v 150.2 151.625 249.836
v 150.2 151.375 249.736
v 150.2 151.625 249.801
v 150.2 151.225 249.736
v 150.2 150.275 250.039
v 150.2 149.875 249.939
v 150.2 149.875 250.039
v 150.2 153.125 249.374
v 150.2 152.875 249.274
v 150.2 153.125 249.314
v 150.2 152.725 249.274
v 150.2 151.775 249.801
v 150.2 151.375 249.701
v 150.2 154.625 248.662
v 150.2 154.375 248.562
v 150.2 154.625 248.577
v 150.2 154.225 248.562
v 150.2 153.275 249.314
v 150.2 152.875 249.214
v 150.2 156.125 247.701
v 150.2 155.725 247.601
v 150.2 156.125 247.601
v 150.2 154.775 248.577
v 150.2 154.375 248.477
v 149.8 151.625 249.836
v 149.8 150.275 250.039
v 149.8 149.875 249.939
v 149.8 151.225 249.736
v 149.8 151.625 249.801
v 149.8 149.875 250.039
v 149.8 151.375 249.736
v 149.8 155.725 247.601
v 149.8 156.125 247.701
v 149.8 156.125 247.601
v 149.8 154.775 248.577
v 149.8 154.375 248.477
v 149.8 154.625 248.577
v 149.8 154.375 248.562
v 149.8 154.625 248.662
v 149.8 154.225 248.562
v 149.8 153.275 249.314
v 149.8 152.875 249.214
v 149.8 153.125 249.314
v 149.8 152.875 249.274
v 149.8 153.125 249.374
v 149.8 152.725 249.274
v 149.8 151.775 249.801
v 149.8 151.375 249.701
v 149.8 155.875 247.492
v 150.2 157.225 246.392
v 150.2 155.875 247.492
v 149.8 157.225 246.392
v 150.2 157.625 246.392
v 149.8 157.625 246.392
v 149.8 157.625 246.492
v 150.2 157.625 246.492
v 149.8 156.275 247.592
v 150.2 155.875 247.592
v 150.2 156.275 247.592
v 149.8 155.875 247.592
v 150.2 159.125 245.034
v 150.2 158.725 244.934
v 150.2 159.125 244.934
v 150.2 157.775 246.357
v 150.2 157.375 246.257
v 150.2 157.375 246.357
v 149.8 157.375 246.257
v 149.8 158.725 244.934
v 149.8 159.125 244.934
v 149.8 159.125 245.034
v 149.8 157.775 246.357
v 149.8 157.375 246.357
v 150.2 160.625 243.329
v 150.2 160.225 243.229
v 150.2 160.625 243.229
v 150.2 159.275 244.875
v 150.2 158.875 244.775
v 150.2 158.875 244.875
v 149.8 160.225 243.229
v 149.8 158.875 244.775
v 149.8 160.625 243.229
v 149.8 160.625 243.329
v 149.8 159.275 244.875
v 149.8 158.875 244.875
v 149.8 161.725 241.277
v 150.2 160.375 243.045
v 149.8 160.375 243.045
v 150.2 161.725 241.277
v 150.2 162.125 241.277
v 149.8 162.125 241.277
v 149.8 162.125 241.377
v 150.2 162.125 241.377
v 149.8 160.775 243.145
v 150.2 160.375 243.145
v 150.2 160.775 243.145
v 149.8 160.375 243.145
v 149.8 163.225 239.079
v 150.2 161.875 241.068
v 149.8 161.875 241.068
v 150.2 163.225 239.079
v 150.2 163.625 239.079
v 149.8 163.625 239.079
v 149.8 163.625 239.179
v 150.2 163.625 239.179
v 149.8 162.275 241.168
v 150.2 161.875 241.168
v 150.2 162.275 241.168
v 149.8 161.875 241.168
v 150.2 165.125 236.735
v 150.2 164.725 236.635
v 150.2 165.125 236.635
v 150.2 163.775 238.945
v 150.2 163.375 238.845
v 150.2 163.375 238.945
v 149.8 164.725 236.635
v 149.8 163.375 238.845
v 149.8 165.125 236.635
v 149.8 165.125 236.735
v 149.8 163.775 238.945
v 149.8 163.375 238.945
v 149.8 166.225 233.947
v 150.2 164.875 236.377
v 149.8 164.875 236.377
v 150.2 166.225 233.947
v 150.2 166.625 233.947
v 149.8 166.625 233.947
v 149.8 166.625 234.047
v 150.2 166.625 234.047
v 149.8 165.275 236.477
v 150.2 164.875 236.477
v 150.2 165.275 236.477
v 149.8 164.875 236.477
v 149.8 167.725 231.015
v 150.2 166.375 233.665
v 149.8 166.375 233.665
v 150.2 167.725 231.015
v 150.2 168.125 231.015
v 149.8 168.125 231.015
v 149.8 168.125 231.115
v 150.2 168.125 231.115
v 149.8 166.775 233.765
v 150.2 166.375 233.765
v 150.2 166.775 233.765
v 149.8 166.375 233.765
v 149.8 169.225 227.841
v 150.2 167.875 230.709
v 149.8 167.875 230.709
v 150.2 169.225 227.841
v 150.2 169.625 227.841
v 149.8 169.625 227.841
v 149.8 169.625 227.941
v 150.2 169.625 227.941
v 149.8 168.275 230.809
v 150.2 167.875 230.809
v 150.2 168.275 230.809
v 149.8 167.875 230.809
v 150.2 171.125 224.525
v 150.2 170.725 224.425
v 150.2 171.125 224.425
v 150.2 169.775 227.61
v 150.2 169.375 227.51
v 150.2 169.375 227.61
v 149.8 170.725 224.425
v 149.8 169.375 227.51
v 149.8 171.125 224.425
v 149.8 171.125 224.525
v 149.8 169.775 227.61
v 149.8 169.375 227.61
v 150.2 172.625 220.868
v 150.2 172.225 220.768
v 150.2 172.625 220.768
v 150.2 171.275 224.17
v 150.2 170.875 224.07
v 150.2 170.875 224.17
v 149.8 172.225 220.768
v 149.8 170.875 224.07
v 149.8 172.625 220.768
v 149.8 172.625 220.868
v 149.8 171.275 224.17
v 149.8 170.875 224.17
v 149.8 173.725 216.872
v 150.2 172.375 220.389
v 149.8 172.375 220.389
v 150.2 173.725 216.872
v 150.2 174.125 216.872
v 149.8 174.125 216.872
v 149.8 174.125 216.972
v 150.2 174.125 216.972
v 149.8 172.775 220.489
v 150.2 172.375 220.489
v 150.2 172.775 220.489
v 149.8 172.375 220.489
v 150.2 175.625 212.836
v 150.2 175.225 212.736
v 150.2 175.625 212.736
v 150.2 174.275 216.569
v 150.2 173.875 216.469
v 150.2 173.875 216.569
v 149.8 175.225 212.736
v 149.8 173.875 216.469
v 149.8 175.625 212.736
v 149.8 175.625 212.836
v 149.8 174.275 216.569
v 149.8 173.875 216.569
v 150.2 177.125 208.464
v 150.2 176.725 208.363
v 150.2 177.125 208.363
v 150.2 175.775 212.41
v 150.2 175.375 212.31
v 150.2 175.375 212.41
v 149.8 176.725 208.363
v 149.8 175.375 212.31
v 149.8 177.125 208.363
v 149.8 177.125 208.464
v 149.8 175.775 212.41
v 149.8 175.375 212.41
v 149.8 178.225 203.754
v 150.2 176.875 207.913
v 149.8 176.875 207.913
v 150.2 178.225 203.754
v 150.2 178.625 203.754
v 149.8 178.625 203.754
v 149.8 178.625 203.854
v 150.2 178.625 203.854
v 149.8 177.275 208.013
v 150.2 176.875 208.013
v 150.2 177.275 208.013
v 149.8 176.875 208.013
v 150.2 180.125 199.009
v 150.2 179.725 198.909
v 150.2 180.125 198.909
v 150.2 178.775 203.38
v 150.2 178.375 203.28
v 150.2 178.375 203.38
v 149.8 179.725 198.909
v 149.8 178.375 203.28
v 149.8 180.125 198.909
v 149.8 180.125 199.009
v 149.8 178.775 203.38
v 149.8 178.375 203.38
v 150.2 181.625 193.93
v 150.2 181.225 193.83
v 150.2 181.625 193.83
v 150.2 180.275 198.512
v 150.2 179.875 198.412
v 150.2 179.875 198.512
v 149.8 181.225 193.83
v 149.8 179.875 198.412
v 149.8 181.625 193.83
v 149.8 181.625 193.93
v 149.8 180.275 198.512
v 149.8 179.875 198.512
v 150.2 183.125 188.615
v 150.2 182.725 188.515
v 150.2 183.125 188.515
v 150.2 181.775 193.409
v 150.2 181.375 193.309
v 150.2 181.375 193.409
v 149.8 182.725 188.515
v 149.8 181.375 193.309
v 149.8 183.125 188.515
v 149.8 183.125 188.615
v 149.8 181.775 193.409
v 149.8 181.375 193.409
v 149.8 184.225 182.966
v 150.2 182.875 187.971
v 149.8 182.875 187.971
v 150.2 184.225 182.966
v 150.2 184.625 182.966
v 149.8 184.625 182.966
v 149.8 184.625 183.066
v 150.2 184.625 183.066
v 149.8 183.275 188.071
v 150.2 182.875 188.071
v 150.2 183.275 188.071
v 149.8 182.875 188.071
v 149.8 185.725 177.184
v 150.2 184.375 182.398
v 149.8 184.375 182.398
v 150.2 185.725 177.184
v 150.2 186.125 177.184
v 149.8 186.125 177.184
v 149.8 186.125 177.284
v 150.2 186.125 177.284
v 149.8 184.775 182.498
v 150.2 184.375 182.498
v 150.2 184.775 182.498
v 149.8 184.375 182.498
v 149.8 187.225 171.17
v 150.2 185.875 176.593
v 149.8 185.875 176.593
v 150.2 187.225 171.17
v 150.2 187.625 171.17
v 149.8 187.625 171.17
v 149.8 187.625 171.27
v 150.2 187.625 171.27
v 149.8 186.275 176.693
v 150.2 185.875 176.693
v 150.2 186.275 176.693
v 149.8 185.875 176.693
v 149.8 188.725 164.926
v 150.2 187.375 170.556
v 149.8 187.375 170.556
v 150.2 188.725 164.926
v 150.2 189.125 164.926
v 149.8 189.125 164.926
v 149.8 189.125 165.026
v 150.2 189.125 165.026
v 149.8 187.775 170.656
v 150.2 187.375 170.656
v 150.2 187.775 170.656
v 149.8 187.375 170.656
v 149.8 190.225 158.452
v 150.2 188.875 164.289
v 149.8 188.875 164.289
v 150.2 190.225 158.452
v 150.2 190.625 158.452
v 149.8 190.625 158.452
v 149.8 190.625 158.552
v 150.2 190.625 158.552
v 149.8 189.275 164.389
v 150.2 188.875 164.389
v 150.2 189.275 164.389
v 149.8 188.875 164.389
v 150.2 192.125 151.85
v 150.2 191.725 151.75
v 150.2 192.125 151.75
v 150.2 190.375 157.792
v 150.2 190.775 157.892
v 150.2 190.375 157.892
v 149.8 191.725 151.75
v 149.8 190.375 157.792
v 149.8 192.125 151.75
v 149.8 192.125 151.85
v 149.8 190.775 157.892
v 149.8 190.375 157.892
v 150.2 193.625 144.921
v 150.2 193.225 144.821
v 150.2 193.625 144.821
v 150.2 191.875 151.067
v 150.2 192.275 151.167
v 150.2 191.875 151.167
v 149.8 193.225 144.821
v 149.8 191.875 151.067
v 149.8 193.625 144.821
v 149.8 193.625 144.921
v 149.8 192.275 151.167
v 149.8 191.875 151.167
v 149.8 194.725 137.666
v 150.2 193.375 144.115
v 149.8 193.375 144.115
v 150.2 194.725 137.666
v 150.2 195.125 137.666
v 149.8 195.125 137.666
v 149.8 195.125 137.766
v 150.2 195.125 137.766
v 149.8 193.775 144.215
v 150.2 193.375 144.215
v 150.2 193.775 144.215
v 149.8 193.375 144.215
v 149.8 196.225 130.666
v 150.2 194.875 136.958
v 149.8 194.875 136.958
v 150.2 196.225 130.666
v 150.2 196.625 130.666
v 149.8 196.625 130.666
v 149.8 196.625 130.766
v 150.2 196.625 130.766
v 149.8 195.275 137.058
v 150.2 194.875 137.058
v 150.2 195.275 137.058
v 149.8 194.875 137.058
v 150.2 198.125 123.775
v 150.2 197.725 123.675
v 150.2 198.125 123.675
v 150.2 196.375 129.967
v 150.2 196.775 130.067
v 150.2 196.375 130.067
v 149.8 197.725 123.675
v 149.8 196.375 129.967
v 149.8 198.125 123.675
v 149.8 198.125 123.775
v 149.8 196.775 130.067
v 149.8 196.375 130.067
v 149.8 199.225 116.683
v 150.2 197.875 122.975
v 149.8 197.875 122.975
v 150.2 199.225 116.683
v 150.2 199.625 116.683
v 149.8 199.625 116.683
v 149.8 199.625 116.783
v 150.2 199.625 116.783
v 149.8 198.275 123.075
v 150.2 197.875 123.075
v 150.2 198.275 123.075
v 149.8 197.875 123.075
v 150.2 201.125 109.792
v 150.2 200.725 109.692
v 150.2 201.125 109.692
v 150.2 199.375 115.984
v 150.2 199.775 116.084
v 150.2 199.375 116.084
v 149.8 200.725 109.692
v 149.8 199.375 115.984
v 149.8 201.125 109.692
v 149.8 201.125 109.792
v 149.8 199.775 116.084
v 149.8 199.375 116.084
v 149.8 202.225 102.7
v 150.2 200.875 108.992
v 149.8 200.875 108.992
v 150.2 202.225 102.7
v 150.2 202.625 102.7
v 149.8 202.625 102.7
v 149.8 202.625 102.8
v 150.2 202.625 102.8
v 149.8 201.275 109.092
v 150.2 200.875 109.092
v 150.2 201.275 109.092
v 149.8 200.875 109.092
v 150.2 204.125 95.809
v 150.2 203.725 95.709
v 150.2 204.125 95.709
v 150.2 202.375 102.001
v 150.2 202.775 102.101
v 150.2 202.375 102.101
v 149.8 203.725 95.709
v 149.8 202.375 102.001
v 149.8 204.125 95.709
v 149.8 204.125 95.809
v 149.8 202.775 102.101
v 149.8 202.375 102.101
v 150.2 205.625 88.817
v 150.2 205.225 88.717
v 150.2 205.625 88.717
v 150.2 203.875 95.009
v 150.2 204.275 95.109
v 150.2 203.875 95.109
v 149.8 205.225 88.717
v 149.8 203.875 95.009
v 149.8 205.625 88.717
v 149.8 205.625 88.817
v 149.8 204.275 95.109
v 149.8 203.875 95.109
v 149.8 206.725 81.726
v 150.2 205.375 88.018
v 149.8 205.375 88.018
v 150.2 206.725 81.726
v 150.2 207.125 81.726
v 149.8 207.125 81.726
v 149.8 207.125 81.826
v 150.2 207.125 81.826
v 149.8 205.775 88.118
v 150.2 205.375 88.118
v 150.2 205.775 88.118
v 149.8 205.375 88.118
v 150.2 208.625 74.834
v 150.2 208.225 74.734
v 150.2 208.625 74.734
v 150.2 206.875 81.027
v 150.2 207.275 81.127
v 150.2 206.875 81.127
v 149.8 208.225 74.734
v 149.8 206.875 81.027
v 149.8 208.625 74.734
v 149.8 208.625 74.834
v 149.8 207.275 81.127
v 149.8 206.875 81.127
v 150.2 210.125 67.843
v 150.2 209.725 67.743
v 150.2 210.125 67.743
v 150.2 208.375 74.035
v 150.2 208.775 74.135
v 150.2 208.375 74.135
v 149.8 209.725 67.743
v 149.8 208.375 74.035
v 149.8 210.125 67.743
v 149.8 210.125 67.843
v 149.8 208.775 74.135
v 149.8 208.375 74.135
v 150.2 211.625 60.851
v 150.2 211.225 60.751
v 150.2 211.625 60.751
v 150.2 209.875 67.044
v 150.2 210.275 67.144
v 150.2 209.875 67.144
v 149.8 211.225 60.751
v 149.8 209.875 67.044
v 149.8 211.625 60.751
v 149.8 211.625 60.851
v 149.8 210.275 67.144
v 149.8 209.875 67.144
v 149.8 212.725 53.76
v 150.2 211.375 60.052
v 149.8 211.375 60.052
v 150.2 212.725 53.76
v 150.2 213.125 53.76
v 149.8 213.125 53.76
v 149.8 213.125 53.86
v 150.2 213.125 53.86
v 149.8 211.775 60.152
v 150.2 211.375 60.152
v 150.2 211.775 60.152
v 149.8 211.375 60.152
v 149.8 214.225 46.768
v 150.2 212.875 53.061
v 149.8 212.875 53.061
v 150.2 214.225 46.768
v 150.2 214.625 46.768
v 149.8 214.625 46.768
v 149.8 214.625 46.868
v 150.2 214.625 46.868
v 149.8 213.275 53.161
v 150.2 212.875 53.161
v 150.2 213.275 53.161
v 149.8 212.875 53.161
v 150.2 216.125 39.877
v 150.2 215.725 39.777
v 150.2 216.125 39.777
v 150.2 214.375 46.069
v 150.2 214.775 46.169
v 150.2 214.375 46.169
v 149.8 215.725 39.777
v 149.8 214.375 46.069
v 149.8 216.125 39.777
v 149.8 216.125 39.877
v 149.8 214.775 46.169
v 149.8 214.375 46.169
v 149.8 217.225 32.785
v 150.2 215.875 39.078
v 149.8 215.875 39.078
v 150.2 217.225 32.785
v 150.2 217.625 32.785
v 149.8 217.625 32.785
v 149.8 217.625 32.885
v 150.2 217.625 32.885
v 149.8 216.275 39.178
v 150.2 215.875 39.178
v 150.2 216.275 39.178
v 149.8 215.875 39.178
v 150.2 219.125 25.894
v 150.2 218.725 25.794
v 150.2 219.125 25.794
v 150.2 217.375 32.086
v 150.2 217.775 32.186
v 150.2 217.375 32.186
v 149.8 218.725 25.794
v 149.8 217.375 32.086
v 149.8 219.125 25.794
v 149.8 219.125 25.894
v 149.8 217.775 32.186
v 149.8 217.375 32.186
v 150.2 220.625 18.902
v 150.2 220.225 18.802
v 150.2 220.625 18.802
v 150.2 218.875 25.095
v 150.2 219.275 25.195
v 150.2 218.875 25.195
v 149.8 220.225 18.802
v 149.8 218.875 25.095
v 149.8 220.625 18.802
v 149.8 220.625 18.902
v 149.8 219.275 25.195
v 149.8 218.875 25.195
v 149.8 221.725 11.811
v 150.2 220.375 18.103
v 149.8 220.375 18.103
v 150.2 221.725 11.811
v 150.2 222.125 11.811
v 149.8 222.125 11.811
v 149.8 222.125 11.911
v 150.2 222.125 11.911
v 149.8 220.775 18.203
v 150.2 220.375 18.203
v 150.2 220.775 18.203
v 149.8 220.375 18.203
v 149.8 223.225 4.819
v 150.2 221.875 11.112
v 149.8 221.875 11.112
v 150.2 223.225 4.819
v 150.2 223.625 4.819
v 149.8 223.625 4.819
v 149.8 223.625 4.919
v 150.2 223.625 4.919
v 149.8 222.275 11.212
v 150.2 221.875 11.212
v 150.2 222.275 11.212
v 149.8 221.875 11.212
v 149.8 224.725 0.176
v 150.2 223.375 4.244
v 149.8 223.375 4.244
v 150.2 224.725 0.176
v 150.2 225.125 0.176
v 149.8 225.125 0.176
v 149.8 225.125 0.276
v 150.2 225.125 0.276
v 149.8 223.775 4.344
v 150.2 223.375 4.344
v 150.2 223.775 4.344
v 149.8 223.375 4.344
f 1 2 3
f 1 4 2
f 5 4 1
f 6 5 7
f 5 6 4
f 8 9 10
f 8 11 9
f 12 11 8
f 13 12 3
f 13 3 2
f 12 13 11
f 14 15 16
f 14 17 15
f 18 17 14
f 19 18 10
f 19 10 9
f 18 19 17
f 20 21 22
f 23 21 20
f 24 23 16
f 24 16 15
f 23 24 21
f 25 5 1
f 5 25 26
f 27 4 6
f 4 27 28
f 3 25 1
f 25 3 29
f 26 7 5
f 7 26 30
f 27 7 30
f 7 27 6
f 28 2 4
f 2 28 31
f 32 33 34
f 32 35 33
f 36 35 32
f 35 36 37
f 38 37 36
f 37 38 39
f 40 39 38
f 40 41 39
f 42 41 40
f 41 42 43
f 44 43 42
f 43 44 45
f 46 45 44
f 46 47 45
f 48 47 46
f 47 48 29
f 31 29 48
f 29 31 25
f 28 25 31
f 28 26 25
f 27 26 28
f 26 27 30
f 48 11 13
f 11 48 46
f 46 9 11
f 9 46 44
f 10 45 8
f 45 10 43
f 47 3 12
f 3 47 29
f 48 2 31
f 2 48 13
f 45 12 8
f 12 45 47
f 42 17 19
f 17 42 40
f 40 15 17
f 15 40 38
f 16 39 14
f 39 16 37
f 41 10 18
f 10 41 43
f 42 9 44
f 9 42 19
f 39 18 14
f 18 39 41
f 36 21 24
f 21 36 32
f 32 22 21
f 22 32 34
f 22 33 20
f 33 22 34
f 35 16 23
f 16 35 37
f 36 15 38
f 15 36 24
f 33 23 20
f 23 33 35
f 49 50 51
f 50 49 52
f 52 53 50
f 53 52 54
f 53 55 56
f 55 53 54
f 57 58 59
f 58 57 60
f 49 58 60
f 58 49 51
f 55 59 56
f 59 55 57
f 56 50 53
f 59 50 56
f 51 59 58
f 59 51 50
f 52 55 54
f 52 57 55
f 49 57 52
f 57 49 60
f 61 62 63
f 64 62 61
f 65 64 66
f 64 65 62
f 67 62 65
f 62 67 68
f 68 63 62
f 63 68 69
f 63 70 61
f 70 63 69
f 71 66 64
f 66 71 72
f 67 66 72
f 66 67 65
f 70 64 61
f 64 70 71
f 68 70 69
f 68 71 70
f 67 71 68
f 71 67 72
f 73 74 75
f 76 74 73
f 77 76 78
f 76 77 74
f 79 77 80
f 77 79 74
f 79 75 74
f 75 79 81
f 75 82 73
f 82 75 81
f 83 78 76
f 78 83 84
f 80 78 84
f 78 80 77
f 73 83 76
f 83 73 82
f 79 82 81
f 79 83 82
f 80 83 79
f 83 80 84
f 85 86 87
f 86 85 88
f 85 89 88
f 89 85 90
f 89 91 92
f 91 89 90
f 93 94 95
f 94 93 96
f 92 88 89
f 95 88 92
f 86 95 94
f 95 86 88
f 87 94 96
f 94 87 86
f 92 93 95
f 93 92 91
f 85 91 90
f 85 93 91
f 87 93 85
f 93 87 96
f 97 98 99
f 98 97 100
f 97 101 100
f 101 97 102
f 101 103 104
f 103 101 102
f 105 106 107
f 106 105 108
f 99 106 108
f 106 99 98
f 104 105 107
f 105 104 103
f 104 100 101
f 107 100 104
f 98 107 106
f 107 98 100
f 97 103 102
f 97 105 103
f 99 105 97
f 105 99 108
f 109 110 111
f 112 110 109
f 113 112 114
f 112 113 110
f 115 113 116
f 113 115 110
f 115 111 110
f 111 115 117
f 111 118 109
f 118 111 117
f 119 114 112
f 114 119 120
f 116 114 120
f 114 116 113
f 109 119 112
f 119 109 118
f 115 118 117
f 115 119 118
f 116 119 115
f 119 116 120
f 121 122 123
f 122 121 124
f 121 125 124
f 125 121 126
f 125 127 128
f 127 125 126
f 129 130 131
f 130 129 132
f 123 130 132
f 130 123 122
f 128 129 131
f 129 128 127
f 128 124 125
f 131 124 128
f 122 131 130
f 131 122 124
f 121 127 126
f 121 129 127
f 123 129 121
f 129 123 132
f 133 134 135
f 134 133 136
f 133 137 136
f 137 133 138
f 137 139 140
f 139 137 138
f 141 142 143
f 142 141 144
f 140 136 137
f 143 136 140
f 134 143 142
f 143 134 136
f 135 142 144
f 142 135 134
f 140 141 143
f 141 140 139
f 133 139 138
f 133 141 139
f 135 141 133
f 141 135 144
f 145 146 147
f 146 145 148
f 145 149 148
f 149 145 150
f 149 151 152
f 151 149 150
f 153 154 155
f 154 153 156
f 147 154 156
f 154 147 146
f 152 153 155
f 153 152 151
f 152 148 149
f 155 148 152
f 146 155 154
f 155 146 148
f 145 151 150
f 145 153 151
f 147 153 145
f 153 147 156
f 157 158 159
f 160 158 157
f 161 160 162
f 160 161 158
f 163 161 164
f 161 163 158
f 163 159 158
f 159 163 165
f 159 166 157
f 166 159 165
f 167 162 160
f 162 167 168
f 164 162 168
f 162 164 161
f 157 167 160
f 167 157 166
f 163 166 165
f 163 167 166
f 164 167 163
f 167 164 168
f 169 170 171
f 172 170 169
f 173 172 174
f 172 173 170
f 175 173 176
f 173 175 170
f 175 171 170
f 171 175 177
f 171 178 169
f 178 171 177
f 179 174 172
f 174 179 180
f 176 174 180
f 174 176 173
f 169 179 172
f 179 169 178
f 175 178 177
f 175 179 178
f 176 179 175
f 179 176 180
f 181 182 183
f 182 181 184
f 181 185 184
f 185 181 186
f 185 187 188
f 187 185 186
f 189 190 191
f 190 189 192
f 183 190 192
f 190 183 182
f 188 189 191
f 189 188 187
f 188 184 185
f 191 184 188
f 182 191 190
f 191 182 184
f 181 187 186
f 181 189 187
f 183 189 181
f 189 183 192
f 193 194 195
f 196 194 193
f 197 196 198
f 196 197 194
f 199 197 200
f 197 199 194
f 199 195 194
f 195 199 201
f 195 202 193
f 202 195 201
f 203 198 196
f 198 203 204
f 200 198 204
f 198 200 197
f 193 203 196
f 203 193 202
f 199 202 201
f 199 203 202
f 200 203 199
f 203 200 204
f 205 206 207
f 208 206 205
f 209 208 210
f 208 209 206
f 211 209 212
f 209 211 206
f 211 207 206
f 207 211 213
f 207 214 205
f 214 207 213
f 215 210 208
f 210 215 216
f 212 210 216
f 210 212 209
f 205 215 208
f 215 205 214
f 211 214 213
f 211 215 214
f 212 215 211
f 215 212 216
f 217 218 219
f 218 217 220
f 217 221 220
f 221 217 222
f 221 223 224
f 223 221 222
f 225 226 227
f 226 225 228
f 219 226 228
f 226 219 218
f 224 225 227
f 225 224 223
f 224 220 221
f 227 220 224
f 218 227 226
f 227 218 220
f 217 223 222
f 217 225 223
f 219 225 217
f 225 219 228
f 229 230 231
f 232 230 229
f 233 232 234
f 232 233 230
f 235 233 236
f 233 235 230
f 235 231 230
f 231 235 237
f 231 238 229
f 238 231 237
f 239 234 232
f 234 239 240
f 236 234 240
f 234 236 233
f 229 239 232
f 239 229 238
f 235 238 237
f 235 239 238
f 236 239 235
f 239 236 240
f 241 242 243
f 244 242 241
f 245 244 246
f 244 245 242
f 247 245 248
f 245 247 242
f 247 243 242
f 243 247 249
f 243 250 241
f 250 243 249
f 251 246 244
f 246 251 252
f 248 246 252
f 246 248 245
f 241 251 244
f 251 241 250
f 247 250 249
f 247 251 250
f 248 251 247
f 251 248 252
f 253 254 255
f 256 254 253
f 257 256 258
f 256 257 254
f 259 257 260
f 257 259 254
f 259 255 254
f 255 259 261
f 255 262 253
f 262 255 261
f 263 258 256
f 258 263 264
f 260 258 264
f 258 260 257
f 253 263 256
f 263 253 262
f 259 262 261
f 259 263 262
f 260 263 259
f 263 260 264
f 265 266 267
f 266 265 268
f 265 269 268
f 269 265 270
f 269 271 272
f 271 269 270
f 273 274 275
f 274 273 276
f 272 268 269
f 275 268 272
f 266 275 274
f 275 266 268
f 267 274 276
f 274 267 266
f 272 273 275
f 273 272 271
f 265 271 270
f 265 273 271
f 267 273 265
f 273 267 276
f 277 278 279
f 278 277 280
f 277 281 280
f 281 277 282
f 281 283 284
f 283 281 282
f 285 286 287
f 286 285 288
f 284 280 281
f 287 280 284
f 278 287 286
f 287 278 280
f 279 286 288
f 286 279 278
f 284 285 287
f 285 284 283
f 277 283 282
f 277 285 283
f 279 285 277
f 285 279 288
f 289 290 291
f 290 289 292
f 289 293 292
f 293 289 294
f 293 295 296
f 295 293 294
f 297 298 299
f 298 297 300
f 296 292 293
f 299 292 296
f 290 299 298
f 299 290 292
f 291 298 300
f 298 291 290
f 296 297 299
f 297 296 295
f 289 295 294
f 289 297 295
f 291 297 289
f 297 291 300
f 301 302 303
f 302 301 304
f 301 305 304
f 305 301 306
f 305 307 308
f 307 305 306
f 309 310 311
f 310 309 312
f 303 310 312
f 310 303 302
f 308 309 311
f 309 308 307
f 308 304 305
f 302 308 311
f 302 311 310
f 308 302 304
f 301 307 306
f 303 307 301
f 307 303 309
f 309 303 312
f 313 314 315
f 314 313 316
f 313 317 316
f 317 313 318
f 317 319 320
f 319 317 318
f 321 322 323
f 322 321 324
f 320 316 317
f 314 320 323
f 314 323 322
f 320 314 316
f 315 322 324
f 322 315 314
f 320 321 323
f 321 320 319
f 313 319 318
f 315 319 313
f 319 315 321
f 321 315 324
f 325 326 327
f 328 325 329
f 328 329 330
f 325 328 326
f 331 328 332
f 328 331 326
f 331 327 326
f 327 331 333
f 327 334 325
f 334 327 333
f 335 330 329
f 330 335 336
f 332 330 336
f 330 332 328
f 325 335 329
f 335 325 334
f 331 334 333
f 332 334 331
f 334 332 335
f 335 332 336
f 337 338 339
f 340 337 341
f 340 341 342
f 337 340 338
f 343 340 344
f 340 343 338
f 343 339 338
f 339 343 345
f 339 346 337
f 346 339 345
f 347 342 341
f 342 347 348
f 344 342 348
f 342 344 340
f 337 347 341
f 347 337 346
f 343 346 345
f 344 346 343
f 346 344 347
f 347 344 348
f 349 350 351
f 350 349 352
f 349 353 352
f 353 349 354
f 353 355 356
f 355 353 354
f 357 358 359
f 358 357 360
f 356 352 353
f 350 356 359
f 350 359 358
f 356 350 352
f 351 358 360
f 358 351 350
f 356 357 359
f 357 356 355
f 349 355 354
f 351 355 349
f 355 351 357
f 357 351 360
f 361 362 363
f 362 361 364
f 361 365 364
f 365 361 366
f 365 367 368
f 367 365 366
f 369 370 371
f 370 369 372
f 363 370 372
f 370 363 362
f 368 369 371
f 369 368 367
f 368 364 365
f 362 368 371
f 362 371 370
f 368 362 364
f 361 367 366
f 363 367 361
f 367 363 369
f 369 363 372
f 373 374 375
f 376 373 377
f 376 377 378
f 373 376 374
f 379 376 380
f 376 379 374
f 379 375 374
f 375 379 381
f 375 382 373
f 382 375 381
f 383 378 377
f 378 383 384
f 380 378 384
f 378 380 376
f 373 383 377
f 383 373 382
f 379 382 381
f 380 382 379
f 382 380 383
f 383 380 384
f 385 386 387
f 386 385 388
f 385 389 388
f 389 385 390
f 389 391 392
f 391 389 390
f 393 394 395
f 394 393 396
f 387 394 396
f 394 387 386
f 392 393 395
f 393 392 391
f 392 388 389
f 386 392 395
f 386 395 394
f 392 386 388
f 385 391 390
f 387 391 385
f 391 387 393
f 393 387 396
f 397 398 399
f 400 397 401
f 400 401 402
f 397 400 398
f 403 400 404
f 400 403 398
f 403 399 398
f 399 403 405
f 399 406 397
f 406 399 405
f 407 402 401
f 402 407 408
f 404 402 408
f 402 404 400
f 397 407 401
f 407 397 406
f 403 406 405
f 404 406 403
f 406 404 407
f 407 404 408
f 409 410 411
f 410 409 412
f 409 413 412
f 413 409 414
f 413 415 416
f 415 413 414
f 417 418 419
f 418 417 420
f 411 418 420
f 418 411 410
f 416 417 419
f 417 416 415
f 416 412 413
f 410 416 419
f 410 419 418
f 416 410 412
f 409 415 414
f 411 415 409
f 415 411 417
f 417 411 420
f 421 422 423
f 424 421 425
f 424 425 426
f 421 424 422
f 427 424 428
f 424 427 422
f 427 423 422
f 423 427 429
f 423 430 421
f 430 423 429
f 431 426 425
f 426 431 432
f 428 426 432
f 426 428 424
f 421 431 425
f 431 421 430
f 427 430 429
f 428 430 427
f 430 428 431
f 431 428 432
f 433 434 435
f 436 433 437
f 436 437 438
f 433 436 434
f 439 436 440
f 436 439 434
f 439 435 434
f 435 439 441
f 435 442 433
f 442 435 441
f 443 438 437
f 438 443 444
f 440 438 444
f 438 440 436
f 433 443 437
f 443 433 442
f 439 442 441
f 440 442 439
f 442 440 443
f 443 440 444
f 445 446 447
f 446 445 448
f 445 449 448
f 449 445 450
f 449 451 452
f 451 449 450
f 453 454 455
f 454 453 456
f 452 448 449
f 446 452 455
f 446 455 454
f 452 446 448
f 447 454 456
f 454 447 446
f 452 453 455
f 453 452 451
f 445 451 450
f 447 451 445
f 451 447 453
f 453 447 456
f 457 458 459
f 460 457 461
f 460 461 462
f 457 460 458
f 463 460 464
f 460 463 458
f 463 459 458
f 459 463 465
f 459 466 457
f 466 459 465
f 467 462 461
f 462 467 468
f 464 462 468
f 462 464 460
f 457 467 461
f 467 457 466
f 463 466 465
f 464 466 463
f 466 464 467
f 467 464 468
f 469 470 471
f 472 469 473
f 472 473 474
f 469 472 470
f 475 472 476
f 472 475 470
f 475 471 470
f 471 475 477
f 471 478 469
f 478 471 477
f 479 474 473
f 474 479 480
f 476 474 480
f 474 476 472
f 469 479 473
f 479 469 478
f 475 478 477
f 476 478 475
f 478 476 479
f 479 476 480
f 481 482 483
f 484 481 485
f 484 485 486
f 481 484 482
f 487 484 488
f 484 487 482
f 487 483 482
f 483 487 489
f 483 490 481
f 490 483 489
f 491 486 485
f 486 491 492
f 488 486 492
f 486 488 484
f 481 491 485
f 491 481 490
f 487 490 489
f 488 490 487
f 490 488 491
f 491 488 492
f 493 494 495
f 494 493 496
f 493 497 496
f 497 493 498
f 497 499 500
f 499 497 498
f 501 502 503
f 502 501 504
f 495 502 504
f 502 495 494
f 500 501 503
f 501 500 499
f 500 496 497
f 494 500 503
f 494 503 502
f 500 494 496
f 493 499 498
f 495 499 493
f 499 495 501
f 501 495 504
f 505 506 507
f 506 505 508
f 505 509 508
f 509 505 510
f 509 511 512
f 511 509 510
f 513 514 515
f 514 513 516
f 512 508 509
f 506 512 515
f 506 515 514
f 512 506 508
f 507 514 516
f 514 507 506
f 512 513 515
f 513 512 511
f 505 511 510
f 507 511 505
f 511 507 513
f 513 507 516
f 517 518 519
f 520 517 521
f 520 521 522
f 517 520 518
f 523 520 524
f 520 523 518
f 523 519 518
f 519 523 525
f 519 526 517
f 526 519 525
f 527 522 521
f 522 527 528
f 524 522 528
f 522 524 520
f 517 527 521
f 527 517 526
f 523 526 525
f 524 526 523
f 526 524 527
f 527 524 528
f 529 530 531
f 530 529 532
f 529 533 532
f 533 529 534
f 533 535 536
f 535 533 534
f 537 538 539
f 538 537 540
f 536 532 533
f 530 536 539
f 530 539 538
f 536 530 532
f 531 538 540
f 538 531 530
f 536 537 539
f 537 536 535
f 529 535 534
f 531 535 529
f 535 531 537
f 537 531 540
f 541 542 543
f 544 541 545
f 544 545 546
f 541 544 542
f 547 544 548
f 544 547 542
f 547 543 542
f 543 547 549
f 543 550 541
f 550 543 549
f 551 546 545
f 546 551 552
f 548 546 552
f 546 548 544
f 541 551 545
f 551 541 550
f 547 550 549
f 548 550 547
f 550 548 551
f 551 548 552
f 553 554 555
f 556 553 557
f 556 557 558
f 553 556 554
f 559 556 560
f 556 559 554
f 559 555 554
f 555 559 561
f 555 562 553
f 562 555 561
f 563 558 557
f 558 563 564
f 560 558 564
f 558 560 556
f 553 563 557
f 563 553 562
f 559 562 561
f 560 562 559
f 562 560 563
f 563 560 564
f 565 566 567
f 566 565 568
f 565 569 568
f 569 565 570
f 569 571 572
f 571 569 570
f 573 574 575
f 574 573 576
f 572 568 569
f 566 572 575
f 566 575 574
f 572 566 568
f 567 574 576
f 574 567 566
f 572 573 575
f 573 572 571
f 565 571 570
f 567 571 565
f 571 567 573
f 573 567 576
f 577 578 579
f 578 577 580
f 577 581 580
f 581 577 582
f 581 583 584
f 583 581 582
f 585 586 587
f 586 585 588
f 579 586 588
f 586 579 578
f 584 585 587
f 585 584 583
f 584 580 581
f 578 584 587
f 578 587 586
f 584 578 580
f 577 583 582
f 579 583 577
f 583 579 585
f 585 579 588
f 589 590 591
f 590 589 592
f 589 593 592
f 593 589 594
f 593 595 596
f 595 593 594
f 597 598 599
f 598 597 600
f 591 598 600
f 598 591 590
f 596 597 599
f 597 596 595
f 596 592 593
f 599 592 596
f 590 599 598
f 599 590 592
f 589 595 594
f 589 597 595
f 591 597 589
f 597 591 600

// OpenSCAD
hull() {
    translate([150.0, 150.075, 249.98875430175855]) cube([0.4, 0.4, 0.1], center=true);
    translate([150.0, 151.42499999999998, 249.78633173341257]) cube([0.4, 0.4, 0.1], center=true);
}


hull() {
    translate([150.0, 151.575, 249.75134894274234]) cube([0.4, 0.4, 0.1], center=true);
    translate([150.0, 152.925, 249.32408127902417]) cube([0.4, 0.4, 0.1], center=true);
}


hull() {
    translate([150.0, 153.07500000000002, 249.26413104123432]) cube([0.4, 0.4, 0.1], center=true);
    translate([150.0, 154.425, 248.61229442473498]) cube([0.4, 0.4, 0.1], center=true);
}


hull() {
    translate([150.0, 154.57500000000002, 248.5274119065146]) cube([0.4, 0.4, 0.1], center=true);
    translate([150.0, 155.925, 247.65136319504694]) cube([0.4, 0.4, 0.1], center=true);
}


hull() {
    translate([150.0, 156.07500000000002, 247.5415938829941]) cube([0.4, 0.4, 0.1], center=true);
    translate([150.0, 157.425, 246.44179497751122]) cube([0.4, 0.4, 0.1], center=true);
}


hull() {
    translate([150.0, 157.575, 246.30719029185246]) cube([0.4, 0.4, 0.1], center=true);
    translate([150.0, 158.92499999999998, 244.9841048554777]) cube([0.4, 0.4, 0.1], center=true);
}


hull() {
    translate([150.0, 159.075, 244.82472041557668]) cube([0.4, 0.4, 0.1], center=true);
    translate([150.0, 160.425, 243.2788859337325]) cube([0.4, 0.4, 0.1], center=true);
}


hull() {
    translate([150.0, 160.57500000000002, 243.09478385078816]) cube([0.4, 0.4, 0.1], center=true);
    translate([150.0, 161.925, 241.32678083963432]) cube([0.4, 0.4, 0.1], center=true);
}


hull() {
    translate([150.0, 162.07500000000002, 241.11803016275687]) cube([0.4, 0.4, 0.1], center=true);
    translate([150.0, 163.425, 239.12852099011613]) cube([0.4, 0.4, 0.1], center=true);
}


hull() {
    translate([150.0, 163.57500000000002, 238.895200466912]) cube([0.4, 0.4, 0.1], center=true);
    translate([150.0, 164.925, 236.68494022187832]) cube([0.4, 0.4, 0.1], center=true);
}


hull() {
    translate([150.0, 165.075, 236.42713434379453]) cube([0.4, 0.4, 0.1], center=true);
    translate([150.0, 166.42499999999998, 233.99688878332]) cube([0.4, 0.4, 0.1], center=true);
}


hull() {
    translate([150.0, 166.575, 233.714685129038]) cube([0.4, 0.4, 0.1], center=true);
    translate([150.0, 167.925, 231.0652649124367]) cube([0.4, 0.4, 0.1], center=true);
}


hull() {
    translate([150.0, 168.07500000000002, 230.75875459698563]) cube([0.4, 0.4, 0.1], center=true);
    translate([150.0, 169.425, 227.89098913546758]) cube([0.4, 0.4, 0.1], center=true);
}


hull() {
    translate([150.0, 169.57500000000002, 227.56026532858465]) cube([0.4, 0.4, 0.1], center=true);
    translate([150.0, 170.925, 224.47500226621]) cube([0.4, 0.4, 0.1], center=true);
}


hull() {
    translate([150.0, 171.07500000000002, 224.1201596574451]) cube([0.4, 0.4, 0.1], center=true);
    translate([150.0, 172.425, 220.81825576205165]) cube([0.4, 0.4, 0.1], center=true);
}


hull() {
    translate([150.0, 172.575, 220.43939002645809]) cube([0.4, 0.4, 0.1], center=true);
    translate([150.0, 173.92499999999998, 216.92171068116735]) cube([0.4, 0.4, 0.1], center=true);
}


hull() {
    translate([150.0, 174.075, 216.51892347282055]) cube([0.4, 0.4, 0.1], center=true);
    translate([150.0, 175.425, 212.78643306786893]) cube([0.4, 0.4, 0.1], center=true);
}


hull() {
    translate([150.0, 175.57500000000002, 212.35983158531363]) cube([0.4, 0.4, 0.1], center=true);
    translate([150.0, 176.925, 208.4134953042698]) cube([0.4, 0.4, 0.1], center=true);
}


hull() {
    translate([150.0, 177.07500000000002, 207.96318727760675]) cube([0.4, 0.4, 0.1], center=true);
    translate([150.0, 178.425, 203.80397907871574]) cube([0.4, 0.4, 0.1], center=true);
}


hull() {
    translate([150.0, 178.57500000000002, 203.33007271458456]) cube([0.4, 0.4, 0.1], center=true);
    translate([150.0, 179.925, 198.95896635911464]) cube([0.4, 0.4, 0.1], center=true);
}


hull() {
    translate([150.0, 180.075, 198.46156989490302]) cube([0.4, 0.4, 0.1], center=true);
    translate([150.0, 181.42499999999998, 193.87953989456358]) cube([0.4, 0.4, 0.1], center=true);
}


hull() {
    translate([150.0, 181.575, 193.35866180167864]) cube([0.4, 0.4, 0.1], center=true);
    translate([150.0, 182.925, 188.5648861300891]) cube([0.4, 0.4, 0.1], center=true);
}


hull() {
    translate([150.0, 183.07500000000002, 188.02053731258812]) cube([0.4, 0.4, 0.1], center=true);
    translate([150.0, 184.425, 183.01603426916037]) cube([0.4, 0.4, 0.1], center=true);
}


hull() {
    translate([150.0, 184.57500000000002, 182.4483251655487]) cube([0.4, 0.4, 0.1], center=true);
    translate([150.0, 185.925, 177.2340643439661]) cube([0.4, 0.4, 0.1], center=true);
}


hull() {
    translate([150.0, 186.07500000000002, 176.64311239786622]) cube([0.4, 0.4, 0.1], center=true);
    translate([150.0, 187.425, 171.2202381896511]) cube([0.4, 0.4, 0.1], center=true);
}


hull() {
    translate([150.0, 187.575, 170.6061634802382]) cube([0.4, 0.4, 0.1], center=true);
    translate([150.0, 188.92499999999998, 164.97569291902076]) cube([0.4, 0.4, 0.1], center=true);
}


hull() {
    translate([150.0, 189.075, 164.33861652846824]) cube([0.4, 0.4, 0.1], center=true);
    translate([150.0, 190.425, 158.5017120597405]) cube([0.4, 0.4, 0.1], center=true);
}


hull() {
    translate([150.0, 190.57500000000002, 157.84176078262928]) cube([0.4, 0.4, 0.1], center=true);
    translate([150.0, 191.925, 151.79954226335485]) cube([0.4, 0.4, 0.1], center=true);
}


hull() {
    translate([150.0, 192.07500000000002, 151.1168479861675]) cube([0.4, 0.4, 0.1], center=true);
    translate([150.0, 193.425, 144.87056951606982]) cube([0.4, 0.4, 0.1], center=true);
}


hull() {
    translate([150.0, 193.57500000000002, 144.16527196443266]) cube([0.4, 0.4, 0.1], center=true);
    translate([150.0, 194.925, 137.71619450506134]) cube([0.4, 0.4, 0.1], center=true);
}


hull() {
    translate([150.0, 195.075, 137.00833862281507]) cube([0.4, 0.4, 0.1], center=true);
    translate([150.0, 196.425, 130.71601020175362]) cube([0.4, 0.4, 0.1], center=true);
}


hull() {
    translate([150.0, 196.575, 130.01686259941346]) cube([0.4, 0.4, 0.1], center=true);
    translate([150.0, 197.925, 123.72453417835204]) cube([0.4, 0.4, 0.1], center=true);
}


hull() {
    translate([150.0, 198.07500000000002, 123.02538657601188]) cube([0.4, 0.4, 0.1], center=true);
    translate([150.0, 199.425, 116.73305815495044]) cube([0.4, 0.4, 0.1], center=true);
}


hull() {
    translate([150.0, 199.57500000000002, 116.03391055261028]) cube([0.4, 0.4, 0.1], center=true);
    translate([150.0, 200.925, 109.74158213154885]) cube([0.4, 0.4, 0.1], center=true);
}


hull() {
    translate([150.0, 201.07500000000002, 109.04243452920869]) cube([0.4, 0.4, 0.1], center=true);
    translate([150.0, 202.425, 102.75010610814724]) cube([0.4, 0.4, 0.1], center=true);
}


hull() {
    translate([150.0, 202.575, 102.05095850580707]) cube([0.4, 0.4, 0.1], center=true);
    translate([150.0, 203.925, 95.75863008474565]) cube([0.4, 0.4, 0.1], center=true);
}


hull() {
    translate([150.0, 204.075, 95.0594824824055]) cube([0.4, 0.4, 0.1], center=true);
    translate([150.0, 205.425, 88.76715406134406]) cube([0.4, 0.4, 0.1], center=true);
}


hull() {
    translate([150.0, 205.57500000000002, 88.0680064590039]) cube([0.4, 0.4, 0.1], center=true);
    translate([150.0, 206.925, 81.77567803794246]) cube([0.4, 0.4, 0.1], center=true);
}


hull() {
    translate([150.0, 207.07500000000002, 81.0765304356023]) cube([0.4, 0.4, 0.1], center=true);
    translate([150.0, 208.425, 74.78420201454084]) cube([0.4, 0.4, 0.1], center=true);
}


hull() {
    translate([150.0, 208.57500000000002, 74.08505441220068]) cube([0.4, 0.4, 0.1], center=true);
    translate([150.0, 209.925, 67.79272599113925]) cube([0.4, 0.4, 0.1], center=true);
}


hull() {
    translate([150.0, 210.075, 67.09357838879909]) cube([0.4, 0.4, 0.1], center=true);
    translate([150.0, 211.425, 60.801249967737654]) cube([0.4, 0.4, 0.1], center=true);
}


hull() {
    translate([150.0, 211.575, 60.1021023653975]) cube([0.4, 0.4, 0.1], center=true);
    translate([150.0, 212.925, 53.80977394433606]) cube([0.4, 0.4, 0.1], center=true);
}


hull() {
    translate([150.0, 213.07500000000002, 53.110626341995896]) cube([0.4, 0.4, 0.1], center=true);
    translate([150.0, 214.425, 46.81829792093445]) cube([0.4, 0.4, 0.1], center=true);
}


hull() {
    translate([150.0, 214.57500000000002, 46.119150318594286]) cube([0.4, 0.4, 0.1], center=true);
    translate([150.0, 215.925, 39.82682189753285]) cube([0.4, 0.4, 0.1], center=true);
}


hull() {
    translate([150.0, 216.07500000000002, 39.12767429519269]) cube([0.4, 0.4, 0.1], center=true);
    translate([150.0, 217.425, 32.83534587413125]) cube([0.4, 0.4, 0.1], center=true);
}


hull() {
    translate([150.0, 217.575, 32.13619827179109]) cube([0.4, 0.4, 0.1], center=true);
    translate([150.0, 218.925, 25.843869850729654]) cube([0.4, 0.4, 0.1], center=true);
}


hull() {
    translate([150.0, 219.075, 25.144722248389492]) cube([0.4, 0.4, 0.1], center=true);
    translate([150.0, 220.425, 18.852393827328054]) cube([0.4, 0.4, 0.1], center=true);
}


hull() {
    translate([150.0, 220.57500000000002, 18.153246224987896]) cube([0.4, 0.4, 0.1], center=true);
    translate([150.0, 221.925, 11.860917803926457]) cube([0.4, 0.4, 0.1], center=true);
}


hull() {
    translate([150.0, 222.07500000000002, 11.161770201586297]) cube([0.4, 0.4, 0.1], center=true);
    translate([150.0, 223.425, 4.869441780524858]) cube([0.4, 0.4, 0.1], center=true);
}


hull() {
    translate([150.0, 223.57500000000002, 4.2938745803870395]) cube([0.4, 0.4, 0.1], center=true);
    translate([150.0, 224.925, 0.22599339896773893]) cube([0.4, 0.4, 0.1], center=true);
}
